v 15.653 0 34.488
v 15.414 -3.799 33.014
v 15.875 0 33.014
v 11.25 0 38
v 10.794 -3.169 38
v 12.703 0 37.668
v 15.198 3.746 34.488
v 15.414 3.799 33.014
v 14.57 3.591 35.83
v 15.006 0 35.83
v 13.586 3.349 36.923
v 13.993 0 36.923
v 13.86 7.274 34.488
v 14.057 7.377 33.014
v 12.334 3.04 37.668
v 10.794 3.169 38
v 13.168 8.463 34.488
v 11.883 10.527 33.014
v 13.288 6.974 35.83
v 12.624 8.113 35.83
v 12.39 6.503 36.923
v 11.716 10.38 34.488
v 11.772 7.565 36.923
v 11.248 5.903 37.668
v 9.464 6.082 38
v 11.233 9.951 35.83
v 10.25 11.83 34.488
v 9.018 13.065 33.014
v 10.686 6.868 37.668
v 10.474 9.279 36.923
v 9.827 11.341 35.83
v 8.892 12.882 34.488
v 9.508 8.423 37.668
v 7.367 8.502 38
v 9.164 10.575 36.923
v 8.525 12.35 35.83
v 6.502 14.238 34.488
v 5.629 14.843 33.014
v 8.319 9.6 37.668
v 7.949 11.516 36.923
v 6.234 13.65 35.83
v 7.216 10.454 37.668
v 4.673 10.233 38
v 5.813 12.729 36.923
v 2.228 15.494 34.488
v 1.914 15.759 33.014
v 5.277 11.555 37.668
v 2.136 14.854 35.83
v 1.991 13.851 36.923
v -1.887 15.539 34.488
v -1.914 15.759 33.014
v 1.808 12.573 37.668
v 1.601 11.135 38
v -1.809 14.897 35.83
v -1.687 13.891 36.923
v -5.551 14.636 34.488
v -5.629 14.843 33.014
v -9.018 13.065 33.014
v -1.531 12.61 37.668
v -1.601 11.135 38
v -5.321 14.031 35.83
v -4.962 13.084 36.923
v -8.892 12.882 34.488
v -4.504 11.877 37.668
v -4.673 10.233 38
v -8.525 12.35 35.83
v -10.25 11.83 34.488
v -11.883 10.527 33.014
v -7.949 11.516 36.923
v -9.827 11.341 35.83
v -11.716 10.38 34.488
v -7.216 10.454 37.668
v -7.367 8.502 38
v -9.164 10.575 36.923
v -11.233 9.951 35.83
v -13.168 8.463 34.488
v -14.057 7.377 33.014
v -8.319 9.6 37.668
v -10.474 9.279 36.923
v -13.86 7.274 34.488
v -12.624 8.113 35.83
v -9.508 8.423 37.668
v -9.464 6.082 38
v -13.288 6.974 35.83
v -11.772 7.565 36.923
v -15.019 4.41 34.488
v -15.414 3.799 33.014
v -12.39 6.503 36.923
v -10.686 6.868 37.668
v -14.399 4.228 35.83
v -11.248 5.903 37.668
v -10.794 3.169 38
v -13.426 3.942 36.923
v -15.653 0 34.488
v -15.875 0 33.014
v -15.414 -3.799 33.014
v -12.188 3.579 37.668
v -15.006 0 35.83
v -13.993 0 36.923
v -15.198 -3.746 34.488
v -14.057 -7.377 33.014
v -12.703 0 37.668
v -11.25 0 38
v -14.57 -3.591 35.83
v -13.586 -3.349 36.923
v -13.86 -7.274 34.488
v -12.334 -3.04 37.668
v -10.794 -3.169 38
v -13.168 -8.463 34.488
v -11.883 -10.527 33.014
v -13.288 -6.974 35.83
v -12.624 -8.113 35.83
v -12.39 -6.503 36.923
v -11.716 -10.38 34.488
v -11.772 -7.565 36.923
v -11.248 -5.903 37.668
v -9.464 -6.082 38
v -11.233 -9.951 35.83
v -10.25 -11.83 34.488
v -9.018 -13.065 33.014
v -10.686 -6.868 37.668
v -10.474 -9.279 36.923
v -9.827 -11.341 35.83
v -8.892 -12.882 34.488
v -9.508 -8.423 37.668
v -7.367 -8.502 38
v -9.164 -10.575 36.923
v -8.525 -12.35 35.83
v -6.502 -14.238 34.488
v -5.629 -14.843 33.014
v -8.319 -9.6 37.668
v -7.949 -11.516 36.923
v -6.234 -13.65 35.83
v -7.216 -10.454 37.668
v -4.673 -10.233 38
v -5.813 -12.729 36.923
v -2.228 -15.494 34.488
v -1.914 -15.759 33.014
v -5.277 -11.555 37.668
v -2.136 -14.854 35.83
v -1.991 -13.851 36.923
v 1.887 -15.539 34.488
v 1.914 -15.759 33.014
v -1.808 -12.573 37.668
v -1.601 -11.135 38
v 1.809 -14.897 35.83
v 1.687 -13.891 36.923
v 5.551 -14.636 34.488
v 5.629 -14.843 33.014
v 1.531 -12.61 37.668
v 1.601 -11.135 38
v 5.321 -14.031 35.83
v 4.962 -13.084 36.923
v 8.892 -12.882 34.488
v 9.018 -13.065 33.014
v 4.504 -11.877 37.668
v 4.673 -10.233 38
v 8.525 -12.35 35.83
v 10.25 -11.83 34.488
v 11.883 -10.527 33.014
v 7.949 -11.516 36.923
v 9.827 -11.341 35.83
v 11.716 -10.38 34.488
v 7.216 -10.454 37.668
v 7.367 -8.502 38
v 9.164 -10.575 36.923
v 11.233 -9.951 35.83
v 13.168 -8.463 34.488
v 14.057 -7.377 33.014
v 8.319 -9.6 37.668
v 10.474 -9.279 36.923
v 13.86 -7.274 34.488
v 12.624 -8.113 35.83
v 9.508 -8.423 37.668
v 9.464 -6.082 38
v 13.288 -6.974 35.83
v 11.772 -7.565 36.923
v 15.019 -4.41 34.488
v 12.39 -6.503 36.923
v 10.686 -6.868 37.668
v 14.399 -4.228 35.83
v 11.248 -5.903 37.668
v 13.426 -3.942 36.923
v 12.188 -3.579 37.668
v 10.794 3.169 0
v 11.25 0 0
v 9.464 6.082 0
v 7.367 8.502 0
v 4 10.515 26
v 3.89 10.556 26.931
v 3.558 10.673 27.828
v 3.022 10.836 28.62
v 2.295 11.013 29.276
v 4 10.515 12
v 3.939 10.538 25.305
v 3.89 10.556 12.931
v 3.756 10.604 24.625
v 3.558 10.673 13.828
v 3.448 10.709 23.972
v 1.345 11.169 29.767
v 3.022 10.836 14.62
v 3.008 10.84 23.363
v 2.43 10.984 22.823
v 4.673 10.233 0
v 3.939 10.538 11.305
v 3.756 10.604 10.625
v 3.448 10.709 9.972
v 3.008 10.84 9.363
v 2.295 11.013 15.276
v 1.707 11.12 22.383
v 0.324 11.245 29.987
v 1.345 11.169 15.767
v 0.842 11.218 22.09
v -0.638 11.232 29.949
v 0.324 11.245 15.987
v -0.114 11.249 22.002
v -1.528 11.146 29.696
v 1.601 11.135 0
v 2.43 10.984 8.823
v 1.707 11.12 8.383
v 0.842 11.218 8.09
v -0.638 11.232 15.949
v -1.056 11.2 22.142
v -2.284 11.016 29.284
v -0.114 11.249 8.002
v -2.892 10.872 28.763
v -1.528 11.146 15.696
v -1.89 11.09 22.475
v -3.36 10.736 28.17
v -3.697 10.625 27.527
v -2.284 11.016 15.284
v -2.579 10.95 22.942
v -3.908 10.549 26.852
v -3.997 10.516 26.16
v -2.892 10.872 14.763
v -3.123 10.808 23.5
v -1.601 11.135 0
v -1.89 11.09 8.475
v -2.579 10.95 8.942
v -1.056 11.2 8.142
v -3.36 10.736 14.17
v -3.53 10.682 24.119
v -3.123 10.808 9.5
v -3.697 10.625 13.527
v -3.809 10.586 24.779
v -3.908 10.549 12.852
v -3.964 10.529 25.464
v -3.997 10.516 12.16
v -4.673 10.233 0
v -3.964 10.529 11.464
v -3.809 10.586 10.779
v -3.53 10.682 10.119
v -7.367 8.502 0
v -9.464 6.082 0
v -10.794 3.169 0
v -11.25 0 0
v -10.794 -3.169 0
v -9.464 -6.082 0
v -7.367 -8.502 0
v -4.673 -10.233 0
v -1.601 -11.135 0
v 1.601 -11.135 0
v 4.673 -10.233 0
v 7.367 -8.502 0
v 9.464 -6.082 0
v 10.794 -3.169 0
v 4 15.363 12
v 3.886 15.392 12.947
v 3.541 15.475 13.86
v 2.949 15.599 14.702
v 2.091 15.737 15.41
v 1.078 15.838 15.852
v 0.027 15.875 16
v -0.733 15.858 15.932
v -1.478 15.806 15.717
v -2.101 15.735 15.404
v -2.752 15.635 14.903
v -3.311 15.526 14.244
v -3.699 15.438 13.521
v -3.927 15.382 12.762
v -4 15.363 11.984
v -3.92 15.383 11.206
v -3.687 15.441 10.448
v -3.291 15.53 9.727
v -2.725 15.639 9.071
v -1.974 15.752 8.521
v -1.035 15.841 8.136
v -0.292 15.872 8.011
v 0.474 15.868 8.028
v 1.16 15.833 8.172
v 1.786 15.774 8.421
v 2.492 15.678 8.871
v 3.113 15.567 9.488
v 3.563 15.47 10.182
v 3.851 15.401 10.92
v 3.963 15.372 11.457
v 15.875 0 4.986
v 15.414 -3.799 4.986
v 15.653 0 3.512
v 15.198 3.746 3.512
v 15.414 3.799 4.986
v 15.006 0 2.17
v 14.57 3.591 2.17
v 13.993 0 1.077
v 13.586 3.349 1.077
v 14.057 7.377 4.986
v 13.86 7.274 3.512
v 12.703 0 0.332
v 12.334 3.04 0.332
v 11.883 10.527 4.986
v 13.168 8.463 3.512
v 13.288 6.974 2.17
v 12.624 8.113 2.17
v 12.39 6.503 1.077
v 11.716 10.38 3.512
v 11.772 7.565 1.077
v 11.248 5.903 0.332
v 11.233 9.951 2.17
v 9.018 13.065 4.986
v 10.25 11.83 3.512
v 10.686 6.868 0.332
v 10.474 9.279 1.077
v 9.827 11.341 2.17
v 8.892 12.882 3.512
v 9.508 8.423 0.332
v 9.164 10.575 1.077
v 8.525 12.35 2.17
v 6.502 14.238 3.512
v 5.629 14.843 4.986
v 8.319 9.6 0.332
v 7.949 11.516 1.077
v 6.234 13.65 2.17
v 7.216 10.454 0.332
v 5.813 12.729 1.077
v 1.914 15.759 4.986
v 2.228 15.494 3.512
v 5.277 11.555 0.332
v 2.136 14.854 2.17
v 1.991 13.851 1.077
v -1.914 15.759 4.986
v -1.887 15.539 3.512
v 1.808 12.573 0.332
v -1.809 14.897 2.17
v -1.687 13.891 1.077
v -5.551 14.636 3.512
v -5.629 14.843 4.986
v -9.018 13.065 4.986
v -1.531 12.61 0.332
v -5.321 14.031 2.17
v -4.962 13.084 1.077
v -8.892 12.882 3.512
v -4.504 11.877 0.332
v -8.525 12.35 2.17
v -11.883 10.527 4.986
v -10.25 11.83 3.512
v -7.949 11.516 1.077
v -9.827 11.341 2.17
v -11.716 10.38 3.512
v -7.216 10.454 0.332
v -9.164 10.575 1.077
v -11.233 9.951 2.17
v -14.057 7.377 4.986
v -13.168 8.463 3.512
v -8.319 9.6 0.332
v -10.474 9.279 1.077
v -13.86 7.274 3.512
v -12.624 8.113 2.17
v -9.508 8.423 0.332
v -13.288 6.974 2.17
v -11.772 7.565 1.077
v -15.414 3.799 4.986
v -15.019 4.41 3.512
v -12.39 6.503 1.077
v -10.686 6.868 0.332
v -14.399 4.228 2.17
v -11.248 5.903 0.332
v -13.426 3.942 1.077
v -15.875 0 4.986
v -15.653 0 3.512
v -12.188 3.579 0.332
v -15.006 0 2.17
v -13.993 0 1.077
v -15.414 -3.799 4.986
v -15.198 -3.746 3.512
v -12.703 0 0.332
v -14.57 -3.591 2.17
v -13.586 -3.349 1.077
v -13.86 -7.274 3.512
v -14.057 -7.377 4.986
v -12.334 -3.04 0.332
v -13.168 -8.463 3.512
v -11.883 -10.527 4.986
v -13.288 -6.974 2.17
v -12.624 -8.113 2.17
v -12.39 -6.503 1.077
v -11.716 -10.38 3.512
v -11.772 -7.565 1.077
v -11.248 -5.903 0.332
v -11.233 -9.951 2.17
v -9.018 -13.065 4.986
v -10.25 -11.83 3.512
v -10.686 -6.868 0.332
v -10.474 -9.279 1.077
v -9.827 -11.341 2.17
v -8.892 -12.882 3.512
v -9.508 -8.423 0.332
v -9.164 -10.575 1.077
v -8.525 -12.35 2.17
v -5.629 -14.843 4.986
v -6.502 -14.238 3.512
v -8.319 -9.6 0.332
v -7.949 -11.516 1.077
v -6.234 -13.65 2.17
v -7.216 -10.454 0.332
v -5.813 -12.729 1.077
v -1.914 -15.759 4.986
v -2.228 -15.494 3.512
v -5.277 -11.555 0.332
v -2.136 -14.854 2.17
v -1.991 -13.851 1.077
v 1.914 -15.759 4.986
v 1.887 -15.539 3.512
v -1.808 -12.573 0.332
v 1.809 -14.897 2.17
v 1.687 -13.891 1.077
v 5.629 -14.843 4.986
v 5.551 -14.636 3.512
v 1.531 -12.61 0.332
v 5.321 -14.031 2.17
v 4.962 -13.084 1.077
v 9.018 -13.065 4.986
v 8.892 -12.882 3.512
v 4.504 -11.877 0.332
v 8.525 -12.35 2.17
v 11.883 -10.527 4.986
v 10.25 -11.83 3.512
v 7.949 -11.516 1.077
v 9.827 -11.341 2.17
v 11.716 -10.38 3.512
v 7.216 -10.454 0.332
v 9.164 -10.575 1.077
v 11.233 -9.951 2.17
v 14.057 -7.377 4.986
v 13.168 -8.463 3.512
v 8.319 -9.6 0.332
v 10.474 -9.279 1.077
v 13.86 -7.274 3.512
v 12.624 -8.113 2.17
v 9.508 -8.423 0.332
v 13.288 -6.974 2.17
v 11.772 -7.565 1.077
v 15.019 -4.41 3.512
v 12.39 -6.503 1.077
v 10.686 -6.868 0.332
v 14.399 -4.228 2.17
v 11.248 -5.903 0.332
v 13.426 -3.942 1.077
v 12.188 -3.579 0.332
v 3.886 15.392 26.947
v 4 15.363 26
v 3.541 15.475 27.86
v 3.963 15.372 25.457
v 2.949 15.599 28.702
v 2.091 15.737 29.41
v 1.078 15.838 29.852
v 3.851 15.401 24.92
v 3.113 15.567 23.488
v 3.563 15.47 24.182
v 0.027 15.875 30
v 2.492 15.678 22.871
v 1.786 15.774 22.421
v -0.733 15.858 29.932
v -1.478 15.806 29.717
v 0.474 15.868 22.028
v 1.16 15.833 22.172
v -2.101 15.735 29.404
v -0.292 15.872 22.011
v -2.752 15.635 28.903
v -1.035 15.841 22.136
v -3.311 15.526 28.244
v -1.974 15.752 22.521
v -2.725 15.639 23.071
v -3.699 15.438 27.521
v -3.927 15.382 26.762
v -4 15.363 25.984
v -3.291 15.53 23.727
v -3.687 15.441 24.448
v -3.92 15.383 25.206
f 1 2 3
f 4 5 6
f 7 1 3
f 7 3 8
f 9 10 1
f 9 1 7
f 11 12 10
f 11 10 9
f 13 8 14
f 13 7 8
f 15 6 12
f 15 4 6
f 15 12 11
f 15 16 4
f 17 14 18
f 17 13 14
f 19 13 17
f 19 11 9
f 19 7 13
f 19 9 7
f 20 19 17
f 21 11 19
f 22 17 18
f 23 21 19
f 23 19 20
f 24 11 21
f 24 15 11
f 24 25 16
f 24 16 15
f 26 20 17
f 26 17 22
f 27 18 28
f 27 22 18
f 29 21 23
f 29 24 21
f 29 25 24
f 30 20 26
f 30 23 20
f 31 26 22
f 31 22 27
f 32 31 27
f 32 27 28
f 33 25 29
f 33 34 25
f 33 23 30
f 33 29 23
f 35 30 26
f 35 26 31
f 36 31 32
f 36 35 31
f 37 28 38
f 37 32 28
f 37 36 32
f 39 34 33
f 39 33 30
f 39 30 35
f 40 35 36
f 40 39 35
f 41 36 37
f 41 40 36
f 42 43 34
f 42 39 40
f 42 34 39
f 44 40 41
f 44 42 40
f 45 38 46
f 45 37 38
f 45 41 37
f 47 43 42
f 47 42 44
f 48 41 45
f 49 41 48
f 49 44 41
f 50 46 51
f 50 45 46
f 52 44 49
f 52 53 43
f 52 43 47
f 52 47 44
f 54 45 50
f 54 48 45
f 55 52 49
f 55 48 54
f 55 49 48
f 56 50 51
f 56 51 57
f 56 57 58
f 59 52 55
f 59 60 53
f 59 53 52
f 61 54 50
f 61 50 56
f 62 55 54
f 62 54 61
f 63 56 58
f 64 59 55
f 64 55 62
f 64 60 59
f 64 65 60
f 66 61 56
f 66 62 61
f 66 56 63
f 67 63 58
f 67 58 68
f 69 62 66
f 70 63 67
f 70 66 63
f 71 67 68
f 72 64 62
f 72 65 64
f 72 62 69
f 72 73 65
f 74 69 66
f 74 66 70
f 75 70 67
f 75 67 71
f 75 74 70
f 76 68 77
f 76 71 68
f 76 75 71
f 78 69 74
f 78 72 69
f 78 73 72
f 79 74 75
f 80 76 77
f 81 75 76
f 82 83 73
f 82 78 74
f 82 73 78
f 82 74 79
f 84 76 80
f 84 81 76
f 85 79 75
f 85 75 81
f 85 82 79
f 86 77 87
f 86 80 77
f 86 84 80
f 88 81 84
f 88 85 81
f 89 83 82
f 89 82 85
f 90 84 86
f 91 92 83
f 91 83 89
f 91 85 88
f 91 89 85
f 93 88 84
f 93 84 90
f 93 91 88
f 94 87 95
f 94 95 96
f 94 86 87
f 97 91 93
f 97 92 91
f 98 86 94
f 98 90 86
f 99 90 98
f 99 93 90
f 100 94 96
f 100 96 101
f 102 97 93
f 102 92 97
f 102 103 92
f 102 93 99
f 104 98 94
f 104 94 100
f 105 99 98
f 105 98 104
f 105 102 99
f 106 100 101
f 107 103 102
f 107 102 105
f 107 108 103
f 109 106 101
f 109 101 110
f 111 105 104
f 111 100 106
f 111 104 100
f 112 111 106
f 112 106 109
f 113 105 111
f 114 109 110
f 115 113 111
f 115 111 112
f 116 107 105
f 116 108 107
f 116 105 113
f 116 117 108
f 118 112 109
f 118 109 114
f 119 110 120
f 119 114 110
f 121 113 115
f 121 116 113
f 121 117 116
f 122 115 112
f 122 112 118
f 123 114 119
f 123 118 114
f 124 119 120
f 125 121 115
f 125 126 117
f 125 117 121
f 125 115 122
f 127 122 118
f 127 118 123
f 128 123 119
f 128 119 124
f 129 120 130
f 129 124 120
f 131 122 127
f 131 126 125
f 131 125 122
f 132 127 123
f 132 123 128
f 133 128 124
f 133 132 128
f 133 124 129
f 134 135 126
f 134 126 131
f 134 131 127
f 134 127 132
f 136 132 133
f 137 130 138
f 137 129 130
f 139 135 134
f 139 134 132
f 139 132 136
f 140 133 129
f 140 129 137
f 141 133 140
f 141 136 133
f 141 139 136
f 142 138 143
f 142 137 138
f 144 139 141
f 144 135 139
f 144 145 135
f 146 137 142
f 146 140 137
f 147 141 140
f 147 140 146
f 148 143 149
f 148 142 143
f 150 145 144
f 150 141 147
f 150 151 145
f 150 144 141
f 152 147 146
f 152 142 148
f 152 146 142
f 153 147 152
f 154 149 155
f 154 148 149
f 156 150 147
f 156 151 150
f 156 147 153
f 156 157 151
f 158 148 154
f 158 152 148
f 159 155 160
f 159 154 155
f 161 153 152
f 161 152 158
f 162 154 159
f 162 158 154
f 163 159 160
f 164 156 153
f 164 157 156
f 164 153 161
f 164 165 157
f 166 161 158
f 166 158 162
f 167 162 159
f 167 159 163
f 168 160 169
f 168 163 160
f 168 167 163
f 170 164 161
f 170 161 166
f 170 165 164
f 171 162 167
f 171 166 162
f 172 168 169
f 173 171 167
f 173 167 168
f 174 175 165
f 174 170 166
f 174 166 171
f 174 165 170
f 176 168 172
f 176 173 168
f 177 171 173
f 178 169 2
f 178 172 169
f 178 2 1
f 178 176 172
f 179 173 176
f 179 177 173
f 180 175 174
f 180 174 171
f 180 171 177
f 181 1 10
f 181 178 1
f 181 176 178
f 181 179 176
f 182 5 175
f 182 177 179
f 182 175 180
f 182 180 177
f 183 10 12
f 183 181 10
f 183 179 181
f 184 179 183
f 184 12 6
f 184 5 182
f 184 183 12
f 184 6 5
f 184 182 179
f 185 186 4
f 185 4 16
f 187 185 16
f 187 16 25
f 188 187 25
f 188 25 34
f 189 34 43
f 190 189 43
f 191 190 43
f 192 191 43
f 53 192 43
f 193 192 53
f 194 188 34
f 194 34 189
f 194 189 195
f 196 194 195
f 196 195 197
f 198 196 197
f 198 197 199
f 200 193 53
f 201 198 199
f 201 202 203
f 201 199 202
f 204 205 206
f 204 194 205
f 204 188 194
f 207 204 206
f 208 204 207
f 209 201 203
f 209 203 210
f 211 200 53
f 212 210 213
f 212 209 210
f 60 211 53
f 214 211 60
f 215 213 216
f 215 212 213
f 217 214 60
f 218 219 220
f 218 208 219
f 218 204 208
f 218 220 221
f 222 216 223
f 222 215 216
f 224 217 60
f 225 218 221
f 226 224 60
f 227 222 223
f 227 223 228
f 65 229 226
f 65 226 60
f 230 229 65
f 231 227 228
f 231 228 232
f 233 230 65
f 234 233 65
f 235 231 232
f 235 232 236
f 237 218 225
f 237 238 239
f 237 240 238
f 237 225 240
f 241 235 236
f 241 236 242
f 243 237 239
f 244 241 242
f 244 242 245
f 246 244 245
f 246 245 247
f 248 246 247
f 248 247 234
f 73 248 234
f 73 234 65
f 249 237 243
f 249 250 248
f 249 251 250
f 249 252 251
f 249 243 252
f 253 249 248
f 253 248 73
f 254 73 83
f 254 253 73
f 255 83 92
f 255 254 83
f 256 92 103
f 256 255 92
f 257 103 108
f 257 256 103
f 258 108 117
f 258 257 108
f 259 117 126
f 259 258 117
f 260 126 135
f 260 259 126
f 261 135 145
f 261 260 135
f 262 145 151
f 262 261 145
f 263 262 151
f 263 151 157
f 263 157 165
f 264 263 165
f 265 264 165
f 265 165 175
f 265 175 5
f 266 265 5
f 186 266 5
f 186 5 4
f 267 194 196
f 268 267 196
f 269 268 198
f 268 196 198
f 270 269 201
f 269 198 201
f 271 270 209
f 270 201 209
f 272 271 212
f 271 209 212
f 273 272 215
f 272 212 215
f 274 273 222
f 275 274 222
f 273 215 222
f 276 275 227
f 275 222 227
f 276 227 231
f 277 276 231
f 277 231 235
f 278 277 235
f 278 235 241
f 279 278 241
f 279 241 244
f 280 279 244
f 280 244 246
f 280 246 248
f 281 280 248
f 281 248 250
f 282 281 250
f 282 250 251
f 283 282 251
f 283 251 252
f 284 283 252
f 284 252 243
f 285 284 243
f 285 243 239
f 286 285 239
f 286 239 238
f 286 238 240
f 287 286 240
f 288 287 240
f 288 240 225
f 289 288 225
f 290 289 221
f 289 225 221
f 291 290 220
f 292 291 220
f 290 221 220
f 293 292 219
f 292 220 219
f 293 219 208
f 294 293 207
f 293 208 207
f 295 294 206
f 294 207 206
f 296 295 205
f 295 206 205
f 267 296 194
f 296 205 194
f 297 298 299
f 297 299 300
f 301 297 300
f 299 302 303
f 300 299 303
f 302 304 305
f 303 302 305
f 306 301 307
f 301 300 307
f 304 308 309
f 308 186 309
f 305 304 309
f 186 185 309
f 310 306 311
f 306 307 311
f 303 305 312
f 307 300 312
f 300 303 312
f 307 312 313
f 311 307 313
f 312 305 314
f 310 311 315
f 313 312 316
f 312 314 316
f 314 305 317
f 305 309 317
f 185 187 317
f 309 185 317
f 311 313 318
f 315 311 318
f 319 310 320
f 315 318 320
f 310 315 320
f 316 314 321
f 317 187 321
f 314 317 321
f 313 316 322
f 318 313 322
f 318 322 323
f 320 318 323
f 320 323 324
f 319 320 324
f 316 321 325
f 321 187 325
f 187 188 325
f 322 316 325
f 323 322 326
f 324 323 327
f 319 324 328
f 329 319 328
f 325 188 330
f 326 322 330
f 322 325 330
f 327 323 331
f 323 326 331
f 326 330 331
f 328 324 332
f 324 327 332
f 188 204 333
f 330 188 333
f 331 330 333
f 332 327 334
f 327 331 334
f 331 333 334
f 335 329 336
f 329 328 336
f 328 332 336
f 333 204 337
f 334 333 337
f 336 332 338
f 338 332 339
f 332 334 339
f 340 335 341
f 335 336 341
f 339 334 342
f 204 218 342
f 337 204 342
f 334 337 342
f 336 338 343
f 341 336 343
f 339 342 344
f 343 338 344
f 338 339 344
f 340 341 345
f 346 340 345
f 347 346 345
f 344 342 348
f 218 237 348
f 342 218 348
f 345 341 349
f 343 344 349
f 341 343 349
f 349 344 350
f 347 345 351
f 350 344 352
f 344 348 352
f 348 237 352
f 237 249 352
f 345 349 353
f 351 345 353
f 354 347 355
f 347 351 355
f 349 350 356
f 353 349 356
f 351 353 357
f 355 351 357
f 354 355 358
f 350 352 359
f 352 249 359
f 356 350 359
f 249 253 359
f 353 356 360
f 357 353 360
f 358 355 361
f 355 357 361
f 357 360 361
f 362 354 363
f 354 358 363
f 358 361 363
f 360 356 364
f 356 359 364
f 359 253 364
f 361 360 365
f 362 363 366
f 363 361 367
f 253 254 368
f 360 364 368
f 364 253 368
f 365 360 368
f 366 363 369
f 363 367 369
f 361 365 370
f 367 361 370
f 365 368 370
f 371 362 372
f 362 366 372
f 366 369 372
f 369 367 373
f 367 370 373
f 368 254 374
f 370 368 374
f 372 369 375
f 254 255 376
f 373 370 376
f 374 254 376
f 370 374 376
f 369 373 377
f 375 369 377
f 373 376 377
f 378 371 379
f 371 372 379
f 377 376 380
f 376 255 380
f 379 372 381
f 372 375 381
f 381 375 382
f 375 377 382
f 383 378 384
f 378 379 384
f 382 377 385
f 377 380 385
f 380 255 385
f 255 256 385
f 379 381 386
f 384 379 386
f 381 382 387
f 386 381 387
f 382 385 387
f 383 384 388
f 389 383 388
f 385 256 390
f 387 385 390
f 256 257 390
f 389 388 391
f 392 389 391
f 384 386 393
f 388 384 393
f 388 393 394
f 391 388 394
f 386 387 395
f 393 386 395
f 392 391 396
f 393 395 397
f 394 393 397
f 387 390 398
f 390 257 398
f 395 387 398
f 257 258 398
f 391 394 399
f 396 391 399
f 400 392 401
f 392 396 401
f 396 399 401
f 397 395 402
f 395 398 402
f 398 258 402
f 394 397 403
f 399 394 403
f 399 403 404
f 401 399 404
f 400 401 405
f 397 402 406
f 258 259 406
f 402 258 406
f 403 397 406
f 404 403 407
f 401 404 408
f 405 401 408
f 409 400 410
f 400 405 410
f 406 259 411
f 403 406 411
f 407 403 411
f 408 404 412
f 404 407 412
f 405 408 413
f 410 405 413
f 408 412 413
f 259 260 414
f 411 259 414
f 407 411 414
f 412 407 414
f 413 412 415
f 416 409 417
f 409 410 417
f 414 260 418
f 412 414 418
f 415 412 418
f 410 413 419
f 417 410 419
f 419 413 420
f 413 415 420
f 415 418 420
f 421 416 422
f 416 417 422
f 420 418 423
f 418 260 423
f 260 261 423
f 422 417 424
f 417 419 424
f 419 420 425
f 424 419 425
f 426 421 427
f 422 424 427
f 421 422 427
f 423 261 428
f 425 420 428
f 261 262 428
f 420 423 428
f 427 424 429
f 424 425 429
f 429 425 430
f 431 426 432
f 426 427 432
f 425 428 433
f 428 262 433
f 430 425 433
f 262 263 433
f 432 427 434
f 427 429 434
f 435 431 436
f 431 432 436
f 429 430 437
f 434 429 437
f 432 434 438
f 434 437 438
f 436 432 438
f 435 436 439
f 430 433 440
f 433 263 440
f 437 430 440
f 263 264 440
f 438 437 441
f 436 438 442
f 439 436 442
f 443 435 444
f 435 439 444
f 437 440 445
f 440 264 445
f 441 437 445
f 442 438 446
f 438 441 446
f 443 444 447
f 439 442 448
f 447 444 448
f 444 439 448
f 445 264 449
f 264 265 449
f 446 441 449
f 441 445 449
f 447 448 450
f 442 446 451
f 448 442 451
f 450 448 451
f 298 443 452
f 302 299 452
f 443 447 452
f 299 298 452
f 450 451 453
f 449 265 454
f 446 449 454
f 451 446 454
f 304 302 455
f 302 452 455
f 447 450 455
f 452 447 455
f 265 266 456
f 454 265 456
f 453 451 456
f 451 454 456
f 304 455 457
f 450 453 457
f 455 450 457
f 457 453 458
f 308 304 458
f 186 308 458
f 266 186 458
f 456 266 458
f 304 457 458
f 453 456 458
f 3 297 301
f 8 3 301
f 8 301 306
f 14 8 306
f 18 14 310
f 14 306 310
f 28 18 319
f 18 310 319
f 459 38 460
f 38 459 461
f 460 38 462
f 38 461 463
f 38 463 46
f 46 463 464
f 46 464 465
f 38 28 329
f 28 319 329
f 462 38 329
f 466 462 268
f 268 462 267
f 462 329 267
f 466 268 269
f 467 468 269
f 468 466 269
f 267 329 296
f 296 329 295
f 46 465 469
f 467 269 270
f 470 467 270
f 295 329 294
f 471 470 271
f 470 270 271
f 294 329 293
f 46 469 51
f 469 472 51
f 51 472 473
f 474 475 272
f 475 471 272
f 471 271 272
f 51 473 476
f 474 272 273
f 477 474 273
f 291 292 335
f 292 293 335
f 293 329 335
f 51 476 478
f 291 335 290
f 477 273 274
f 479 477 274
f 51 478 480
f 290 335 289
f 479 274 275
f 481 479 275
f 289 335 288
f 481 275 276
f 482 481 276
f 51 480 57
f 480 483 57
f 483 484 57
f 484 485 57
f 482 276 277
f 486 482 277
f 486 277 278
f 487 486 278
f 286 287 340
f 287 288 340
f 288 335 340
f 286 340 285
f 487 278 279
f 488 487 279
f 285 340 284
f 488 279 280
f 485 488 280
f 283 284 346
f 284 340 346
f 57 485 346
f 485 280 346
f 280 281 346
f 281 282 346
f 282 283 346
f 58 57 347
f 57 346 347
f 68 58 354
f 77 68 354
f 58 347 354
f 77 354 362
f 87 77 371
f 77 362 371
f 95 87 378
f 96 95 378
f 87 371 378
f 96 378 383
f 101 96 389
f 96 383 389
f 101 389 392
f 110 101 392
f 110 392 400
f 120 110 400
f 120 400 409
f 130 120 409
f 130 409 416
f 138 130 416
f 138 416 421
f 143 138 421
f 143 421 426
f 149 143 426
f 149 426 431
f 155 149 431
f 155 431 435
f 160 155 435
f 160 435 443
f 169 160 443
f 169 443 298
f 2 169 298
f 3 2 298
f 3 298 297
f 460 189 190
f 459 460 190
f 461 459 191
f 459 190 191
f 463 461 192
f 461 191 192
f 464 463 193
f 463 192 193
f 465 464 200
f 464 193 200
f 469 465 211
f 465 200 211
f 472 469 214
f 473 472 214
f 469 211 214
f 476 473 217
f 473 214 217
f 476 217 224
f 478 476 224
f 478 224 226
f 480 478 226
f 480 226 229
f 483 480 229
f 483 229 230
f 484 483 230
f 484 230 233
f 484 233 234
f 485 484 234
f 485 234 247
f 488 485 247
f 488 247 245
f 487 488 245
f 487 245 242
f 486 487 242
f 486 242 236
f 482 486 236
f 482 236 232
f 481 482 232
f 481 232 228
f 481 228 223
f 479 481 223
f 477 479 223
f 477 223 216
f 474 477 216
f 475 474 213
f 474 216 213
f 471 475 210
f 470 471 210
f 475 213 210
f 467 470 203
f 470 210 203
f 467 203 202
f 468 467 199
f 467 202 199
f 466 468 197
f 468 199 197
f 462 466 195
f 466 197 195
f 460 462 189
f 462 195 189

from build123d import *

# Parameters (mm, degrees)
F0_R     = 15.875
F0_R_2   = 11.25
F1_DEPTH = 38
F3_R     = 4
F4_DEPTH = 15.876


# Not quite as in the source:
# - a fillet or chamfer that OpenCascade refuses, or shapes differently, is made with other operations: its cross-section is extruded or revolved along the edge and cut away or added


with BuildPart() as f1:
    # F0 (on Top) → F1 (new body)
    with BuildSketch(Plane.XY):
        Circle(F0_R)
        Circle(F0_R_2, mode=Mode.SUBTRACT)
    extrude(amount=F1_DEPTH)

    # F2: fillet of radius 5 on 2 edges, made by hand

    # F2_s1 → F2_t2 (revolve, cut)
    with BuildSketch(Plane.XZ):
        with BuildLine():
            ThreePointArc((15.875, 33.0140823312), (14.5407195747, 36.4144499584), (11.25, 38))
            Line((11.25, 38), (15.875, 38))
            Line((15.875, 38), (15.875, 33.0140823312))
        make_face()
    revolve(axis=Axis((0, 0, 38), (0, 0, 1)), mode=Mode.SUBTRACT)

    # F2_s3 → F2_t4 (revolve, cut)
    with BuildSketch(Plane.XZ):
        with BuildLine():
            ThreePointArc((15.875, 4.9859176688), (14.5407195747, 1.5855500416), (11.25, 0))
            Line((11.25, 0), (15.875, 0))
            Line((15.875, 0), (15.875, 4.9859176688))
        make_face()
    revolve(axis=Axis((0, 0, 0), (0, 0, 1)), mode=Mode.SUBTRACT)

    # F3 (on Front) → F4 (cut, through all)
    with BuildSketch(Plane.XZ):
        with Locations((0, 12)):
            Circle(F3_R)
        with Locations((0, 26)):
            Circle(F3_R)
    extrude(amount=-F4_DEPTH, mode=Mode.SUBTRACT)


solid = f1.part
